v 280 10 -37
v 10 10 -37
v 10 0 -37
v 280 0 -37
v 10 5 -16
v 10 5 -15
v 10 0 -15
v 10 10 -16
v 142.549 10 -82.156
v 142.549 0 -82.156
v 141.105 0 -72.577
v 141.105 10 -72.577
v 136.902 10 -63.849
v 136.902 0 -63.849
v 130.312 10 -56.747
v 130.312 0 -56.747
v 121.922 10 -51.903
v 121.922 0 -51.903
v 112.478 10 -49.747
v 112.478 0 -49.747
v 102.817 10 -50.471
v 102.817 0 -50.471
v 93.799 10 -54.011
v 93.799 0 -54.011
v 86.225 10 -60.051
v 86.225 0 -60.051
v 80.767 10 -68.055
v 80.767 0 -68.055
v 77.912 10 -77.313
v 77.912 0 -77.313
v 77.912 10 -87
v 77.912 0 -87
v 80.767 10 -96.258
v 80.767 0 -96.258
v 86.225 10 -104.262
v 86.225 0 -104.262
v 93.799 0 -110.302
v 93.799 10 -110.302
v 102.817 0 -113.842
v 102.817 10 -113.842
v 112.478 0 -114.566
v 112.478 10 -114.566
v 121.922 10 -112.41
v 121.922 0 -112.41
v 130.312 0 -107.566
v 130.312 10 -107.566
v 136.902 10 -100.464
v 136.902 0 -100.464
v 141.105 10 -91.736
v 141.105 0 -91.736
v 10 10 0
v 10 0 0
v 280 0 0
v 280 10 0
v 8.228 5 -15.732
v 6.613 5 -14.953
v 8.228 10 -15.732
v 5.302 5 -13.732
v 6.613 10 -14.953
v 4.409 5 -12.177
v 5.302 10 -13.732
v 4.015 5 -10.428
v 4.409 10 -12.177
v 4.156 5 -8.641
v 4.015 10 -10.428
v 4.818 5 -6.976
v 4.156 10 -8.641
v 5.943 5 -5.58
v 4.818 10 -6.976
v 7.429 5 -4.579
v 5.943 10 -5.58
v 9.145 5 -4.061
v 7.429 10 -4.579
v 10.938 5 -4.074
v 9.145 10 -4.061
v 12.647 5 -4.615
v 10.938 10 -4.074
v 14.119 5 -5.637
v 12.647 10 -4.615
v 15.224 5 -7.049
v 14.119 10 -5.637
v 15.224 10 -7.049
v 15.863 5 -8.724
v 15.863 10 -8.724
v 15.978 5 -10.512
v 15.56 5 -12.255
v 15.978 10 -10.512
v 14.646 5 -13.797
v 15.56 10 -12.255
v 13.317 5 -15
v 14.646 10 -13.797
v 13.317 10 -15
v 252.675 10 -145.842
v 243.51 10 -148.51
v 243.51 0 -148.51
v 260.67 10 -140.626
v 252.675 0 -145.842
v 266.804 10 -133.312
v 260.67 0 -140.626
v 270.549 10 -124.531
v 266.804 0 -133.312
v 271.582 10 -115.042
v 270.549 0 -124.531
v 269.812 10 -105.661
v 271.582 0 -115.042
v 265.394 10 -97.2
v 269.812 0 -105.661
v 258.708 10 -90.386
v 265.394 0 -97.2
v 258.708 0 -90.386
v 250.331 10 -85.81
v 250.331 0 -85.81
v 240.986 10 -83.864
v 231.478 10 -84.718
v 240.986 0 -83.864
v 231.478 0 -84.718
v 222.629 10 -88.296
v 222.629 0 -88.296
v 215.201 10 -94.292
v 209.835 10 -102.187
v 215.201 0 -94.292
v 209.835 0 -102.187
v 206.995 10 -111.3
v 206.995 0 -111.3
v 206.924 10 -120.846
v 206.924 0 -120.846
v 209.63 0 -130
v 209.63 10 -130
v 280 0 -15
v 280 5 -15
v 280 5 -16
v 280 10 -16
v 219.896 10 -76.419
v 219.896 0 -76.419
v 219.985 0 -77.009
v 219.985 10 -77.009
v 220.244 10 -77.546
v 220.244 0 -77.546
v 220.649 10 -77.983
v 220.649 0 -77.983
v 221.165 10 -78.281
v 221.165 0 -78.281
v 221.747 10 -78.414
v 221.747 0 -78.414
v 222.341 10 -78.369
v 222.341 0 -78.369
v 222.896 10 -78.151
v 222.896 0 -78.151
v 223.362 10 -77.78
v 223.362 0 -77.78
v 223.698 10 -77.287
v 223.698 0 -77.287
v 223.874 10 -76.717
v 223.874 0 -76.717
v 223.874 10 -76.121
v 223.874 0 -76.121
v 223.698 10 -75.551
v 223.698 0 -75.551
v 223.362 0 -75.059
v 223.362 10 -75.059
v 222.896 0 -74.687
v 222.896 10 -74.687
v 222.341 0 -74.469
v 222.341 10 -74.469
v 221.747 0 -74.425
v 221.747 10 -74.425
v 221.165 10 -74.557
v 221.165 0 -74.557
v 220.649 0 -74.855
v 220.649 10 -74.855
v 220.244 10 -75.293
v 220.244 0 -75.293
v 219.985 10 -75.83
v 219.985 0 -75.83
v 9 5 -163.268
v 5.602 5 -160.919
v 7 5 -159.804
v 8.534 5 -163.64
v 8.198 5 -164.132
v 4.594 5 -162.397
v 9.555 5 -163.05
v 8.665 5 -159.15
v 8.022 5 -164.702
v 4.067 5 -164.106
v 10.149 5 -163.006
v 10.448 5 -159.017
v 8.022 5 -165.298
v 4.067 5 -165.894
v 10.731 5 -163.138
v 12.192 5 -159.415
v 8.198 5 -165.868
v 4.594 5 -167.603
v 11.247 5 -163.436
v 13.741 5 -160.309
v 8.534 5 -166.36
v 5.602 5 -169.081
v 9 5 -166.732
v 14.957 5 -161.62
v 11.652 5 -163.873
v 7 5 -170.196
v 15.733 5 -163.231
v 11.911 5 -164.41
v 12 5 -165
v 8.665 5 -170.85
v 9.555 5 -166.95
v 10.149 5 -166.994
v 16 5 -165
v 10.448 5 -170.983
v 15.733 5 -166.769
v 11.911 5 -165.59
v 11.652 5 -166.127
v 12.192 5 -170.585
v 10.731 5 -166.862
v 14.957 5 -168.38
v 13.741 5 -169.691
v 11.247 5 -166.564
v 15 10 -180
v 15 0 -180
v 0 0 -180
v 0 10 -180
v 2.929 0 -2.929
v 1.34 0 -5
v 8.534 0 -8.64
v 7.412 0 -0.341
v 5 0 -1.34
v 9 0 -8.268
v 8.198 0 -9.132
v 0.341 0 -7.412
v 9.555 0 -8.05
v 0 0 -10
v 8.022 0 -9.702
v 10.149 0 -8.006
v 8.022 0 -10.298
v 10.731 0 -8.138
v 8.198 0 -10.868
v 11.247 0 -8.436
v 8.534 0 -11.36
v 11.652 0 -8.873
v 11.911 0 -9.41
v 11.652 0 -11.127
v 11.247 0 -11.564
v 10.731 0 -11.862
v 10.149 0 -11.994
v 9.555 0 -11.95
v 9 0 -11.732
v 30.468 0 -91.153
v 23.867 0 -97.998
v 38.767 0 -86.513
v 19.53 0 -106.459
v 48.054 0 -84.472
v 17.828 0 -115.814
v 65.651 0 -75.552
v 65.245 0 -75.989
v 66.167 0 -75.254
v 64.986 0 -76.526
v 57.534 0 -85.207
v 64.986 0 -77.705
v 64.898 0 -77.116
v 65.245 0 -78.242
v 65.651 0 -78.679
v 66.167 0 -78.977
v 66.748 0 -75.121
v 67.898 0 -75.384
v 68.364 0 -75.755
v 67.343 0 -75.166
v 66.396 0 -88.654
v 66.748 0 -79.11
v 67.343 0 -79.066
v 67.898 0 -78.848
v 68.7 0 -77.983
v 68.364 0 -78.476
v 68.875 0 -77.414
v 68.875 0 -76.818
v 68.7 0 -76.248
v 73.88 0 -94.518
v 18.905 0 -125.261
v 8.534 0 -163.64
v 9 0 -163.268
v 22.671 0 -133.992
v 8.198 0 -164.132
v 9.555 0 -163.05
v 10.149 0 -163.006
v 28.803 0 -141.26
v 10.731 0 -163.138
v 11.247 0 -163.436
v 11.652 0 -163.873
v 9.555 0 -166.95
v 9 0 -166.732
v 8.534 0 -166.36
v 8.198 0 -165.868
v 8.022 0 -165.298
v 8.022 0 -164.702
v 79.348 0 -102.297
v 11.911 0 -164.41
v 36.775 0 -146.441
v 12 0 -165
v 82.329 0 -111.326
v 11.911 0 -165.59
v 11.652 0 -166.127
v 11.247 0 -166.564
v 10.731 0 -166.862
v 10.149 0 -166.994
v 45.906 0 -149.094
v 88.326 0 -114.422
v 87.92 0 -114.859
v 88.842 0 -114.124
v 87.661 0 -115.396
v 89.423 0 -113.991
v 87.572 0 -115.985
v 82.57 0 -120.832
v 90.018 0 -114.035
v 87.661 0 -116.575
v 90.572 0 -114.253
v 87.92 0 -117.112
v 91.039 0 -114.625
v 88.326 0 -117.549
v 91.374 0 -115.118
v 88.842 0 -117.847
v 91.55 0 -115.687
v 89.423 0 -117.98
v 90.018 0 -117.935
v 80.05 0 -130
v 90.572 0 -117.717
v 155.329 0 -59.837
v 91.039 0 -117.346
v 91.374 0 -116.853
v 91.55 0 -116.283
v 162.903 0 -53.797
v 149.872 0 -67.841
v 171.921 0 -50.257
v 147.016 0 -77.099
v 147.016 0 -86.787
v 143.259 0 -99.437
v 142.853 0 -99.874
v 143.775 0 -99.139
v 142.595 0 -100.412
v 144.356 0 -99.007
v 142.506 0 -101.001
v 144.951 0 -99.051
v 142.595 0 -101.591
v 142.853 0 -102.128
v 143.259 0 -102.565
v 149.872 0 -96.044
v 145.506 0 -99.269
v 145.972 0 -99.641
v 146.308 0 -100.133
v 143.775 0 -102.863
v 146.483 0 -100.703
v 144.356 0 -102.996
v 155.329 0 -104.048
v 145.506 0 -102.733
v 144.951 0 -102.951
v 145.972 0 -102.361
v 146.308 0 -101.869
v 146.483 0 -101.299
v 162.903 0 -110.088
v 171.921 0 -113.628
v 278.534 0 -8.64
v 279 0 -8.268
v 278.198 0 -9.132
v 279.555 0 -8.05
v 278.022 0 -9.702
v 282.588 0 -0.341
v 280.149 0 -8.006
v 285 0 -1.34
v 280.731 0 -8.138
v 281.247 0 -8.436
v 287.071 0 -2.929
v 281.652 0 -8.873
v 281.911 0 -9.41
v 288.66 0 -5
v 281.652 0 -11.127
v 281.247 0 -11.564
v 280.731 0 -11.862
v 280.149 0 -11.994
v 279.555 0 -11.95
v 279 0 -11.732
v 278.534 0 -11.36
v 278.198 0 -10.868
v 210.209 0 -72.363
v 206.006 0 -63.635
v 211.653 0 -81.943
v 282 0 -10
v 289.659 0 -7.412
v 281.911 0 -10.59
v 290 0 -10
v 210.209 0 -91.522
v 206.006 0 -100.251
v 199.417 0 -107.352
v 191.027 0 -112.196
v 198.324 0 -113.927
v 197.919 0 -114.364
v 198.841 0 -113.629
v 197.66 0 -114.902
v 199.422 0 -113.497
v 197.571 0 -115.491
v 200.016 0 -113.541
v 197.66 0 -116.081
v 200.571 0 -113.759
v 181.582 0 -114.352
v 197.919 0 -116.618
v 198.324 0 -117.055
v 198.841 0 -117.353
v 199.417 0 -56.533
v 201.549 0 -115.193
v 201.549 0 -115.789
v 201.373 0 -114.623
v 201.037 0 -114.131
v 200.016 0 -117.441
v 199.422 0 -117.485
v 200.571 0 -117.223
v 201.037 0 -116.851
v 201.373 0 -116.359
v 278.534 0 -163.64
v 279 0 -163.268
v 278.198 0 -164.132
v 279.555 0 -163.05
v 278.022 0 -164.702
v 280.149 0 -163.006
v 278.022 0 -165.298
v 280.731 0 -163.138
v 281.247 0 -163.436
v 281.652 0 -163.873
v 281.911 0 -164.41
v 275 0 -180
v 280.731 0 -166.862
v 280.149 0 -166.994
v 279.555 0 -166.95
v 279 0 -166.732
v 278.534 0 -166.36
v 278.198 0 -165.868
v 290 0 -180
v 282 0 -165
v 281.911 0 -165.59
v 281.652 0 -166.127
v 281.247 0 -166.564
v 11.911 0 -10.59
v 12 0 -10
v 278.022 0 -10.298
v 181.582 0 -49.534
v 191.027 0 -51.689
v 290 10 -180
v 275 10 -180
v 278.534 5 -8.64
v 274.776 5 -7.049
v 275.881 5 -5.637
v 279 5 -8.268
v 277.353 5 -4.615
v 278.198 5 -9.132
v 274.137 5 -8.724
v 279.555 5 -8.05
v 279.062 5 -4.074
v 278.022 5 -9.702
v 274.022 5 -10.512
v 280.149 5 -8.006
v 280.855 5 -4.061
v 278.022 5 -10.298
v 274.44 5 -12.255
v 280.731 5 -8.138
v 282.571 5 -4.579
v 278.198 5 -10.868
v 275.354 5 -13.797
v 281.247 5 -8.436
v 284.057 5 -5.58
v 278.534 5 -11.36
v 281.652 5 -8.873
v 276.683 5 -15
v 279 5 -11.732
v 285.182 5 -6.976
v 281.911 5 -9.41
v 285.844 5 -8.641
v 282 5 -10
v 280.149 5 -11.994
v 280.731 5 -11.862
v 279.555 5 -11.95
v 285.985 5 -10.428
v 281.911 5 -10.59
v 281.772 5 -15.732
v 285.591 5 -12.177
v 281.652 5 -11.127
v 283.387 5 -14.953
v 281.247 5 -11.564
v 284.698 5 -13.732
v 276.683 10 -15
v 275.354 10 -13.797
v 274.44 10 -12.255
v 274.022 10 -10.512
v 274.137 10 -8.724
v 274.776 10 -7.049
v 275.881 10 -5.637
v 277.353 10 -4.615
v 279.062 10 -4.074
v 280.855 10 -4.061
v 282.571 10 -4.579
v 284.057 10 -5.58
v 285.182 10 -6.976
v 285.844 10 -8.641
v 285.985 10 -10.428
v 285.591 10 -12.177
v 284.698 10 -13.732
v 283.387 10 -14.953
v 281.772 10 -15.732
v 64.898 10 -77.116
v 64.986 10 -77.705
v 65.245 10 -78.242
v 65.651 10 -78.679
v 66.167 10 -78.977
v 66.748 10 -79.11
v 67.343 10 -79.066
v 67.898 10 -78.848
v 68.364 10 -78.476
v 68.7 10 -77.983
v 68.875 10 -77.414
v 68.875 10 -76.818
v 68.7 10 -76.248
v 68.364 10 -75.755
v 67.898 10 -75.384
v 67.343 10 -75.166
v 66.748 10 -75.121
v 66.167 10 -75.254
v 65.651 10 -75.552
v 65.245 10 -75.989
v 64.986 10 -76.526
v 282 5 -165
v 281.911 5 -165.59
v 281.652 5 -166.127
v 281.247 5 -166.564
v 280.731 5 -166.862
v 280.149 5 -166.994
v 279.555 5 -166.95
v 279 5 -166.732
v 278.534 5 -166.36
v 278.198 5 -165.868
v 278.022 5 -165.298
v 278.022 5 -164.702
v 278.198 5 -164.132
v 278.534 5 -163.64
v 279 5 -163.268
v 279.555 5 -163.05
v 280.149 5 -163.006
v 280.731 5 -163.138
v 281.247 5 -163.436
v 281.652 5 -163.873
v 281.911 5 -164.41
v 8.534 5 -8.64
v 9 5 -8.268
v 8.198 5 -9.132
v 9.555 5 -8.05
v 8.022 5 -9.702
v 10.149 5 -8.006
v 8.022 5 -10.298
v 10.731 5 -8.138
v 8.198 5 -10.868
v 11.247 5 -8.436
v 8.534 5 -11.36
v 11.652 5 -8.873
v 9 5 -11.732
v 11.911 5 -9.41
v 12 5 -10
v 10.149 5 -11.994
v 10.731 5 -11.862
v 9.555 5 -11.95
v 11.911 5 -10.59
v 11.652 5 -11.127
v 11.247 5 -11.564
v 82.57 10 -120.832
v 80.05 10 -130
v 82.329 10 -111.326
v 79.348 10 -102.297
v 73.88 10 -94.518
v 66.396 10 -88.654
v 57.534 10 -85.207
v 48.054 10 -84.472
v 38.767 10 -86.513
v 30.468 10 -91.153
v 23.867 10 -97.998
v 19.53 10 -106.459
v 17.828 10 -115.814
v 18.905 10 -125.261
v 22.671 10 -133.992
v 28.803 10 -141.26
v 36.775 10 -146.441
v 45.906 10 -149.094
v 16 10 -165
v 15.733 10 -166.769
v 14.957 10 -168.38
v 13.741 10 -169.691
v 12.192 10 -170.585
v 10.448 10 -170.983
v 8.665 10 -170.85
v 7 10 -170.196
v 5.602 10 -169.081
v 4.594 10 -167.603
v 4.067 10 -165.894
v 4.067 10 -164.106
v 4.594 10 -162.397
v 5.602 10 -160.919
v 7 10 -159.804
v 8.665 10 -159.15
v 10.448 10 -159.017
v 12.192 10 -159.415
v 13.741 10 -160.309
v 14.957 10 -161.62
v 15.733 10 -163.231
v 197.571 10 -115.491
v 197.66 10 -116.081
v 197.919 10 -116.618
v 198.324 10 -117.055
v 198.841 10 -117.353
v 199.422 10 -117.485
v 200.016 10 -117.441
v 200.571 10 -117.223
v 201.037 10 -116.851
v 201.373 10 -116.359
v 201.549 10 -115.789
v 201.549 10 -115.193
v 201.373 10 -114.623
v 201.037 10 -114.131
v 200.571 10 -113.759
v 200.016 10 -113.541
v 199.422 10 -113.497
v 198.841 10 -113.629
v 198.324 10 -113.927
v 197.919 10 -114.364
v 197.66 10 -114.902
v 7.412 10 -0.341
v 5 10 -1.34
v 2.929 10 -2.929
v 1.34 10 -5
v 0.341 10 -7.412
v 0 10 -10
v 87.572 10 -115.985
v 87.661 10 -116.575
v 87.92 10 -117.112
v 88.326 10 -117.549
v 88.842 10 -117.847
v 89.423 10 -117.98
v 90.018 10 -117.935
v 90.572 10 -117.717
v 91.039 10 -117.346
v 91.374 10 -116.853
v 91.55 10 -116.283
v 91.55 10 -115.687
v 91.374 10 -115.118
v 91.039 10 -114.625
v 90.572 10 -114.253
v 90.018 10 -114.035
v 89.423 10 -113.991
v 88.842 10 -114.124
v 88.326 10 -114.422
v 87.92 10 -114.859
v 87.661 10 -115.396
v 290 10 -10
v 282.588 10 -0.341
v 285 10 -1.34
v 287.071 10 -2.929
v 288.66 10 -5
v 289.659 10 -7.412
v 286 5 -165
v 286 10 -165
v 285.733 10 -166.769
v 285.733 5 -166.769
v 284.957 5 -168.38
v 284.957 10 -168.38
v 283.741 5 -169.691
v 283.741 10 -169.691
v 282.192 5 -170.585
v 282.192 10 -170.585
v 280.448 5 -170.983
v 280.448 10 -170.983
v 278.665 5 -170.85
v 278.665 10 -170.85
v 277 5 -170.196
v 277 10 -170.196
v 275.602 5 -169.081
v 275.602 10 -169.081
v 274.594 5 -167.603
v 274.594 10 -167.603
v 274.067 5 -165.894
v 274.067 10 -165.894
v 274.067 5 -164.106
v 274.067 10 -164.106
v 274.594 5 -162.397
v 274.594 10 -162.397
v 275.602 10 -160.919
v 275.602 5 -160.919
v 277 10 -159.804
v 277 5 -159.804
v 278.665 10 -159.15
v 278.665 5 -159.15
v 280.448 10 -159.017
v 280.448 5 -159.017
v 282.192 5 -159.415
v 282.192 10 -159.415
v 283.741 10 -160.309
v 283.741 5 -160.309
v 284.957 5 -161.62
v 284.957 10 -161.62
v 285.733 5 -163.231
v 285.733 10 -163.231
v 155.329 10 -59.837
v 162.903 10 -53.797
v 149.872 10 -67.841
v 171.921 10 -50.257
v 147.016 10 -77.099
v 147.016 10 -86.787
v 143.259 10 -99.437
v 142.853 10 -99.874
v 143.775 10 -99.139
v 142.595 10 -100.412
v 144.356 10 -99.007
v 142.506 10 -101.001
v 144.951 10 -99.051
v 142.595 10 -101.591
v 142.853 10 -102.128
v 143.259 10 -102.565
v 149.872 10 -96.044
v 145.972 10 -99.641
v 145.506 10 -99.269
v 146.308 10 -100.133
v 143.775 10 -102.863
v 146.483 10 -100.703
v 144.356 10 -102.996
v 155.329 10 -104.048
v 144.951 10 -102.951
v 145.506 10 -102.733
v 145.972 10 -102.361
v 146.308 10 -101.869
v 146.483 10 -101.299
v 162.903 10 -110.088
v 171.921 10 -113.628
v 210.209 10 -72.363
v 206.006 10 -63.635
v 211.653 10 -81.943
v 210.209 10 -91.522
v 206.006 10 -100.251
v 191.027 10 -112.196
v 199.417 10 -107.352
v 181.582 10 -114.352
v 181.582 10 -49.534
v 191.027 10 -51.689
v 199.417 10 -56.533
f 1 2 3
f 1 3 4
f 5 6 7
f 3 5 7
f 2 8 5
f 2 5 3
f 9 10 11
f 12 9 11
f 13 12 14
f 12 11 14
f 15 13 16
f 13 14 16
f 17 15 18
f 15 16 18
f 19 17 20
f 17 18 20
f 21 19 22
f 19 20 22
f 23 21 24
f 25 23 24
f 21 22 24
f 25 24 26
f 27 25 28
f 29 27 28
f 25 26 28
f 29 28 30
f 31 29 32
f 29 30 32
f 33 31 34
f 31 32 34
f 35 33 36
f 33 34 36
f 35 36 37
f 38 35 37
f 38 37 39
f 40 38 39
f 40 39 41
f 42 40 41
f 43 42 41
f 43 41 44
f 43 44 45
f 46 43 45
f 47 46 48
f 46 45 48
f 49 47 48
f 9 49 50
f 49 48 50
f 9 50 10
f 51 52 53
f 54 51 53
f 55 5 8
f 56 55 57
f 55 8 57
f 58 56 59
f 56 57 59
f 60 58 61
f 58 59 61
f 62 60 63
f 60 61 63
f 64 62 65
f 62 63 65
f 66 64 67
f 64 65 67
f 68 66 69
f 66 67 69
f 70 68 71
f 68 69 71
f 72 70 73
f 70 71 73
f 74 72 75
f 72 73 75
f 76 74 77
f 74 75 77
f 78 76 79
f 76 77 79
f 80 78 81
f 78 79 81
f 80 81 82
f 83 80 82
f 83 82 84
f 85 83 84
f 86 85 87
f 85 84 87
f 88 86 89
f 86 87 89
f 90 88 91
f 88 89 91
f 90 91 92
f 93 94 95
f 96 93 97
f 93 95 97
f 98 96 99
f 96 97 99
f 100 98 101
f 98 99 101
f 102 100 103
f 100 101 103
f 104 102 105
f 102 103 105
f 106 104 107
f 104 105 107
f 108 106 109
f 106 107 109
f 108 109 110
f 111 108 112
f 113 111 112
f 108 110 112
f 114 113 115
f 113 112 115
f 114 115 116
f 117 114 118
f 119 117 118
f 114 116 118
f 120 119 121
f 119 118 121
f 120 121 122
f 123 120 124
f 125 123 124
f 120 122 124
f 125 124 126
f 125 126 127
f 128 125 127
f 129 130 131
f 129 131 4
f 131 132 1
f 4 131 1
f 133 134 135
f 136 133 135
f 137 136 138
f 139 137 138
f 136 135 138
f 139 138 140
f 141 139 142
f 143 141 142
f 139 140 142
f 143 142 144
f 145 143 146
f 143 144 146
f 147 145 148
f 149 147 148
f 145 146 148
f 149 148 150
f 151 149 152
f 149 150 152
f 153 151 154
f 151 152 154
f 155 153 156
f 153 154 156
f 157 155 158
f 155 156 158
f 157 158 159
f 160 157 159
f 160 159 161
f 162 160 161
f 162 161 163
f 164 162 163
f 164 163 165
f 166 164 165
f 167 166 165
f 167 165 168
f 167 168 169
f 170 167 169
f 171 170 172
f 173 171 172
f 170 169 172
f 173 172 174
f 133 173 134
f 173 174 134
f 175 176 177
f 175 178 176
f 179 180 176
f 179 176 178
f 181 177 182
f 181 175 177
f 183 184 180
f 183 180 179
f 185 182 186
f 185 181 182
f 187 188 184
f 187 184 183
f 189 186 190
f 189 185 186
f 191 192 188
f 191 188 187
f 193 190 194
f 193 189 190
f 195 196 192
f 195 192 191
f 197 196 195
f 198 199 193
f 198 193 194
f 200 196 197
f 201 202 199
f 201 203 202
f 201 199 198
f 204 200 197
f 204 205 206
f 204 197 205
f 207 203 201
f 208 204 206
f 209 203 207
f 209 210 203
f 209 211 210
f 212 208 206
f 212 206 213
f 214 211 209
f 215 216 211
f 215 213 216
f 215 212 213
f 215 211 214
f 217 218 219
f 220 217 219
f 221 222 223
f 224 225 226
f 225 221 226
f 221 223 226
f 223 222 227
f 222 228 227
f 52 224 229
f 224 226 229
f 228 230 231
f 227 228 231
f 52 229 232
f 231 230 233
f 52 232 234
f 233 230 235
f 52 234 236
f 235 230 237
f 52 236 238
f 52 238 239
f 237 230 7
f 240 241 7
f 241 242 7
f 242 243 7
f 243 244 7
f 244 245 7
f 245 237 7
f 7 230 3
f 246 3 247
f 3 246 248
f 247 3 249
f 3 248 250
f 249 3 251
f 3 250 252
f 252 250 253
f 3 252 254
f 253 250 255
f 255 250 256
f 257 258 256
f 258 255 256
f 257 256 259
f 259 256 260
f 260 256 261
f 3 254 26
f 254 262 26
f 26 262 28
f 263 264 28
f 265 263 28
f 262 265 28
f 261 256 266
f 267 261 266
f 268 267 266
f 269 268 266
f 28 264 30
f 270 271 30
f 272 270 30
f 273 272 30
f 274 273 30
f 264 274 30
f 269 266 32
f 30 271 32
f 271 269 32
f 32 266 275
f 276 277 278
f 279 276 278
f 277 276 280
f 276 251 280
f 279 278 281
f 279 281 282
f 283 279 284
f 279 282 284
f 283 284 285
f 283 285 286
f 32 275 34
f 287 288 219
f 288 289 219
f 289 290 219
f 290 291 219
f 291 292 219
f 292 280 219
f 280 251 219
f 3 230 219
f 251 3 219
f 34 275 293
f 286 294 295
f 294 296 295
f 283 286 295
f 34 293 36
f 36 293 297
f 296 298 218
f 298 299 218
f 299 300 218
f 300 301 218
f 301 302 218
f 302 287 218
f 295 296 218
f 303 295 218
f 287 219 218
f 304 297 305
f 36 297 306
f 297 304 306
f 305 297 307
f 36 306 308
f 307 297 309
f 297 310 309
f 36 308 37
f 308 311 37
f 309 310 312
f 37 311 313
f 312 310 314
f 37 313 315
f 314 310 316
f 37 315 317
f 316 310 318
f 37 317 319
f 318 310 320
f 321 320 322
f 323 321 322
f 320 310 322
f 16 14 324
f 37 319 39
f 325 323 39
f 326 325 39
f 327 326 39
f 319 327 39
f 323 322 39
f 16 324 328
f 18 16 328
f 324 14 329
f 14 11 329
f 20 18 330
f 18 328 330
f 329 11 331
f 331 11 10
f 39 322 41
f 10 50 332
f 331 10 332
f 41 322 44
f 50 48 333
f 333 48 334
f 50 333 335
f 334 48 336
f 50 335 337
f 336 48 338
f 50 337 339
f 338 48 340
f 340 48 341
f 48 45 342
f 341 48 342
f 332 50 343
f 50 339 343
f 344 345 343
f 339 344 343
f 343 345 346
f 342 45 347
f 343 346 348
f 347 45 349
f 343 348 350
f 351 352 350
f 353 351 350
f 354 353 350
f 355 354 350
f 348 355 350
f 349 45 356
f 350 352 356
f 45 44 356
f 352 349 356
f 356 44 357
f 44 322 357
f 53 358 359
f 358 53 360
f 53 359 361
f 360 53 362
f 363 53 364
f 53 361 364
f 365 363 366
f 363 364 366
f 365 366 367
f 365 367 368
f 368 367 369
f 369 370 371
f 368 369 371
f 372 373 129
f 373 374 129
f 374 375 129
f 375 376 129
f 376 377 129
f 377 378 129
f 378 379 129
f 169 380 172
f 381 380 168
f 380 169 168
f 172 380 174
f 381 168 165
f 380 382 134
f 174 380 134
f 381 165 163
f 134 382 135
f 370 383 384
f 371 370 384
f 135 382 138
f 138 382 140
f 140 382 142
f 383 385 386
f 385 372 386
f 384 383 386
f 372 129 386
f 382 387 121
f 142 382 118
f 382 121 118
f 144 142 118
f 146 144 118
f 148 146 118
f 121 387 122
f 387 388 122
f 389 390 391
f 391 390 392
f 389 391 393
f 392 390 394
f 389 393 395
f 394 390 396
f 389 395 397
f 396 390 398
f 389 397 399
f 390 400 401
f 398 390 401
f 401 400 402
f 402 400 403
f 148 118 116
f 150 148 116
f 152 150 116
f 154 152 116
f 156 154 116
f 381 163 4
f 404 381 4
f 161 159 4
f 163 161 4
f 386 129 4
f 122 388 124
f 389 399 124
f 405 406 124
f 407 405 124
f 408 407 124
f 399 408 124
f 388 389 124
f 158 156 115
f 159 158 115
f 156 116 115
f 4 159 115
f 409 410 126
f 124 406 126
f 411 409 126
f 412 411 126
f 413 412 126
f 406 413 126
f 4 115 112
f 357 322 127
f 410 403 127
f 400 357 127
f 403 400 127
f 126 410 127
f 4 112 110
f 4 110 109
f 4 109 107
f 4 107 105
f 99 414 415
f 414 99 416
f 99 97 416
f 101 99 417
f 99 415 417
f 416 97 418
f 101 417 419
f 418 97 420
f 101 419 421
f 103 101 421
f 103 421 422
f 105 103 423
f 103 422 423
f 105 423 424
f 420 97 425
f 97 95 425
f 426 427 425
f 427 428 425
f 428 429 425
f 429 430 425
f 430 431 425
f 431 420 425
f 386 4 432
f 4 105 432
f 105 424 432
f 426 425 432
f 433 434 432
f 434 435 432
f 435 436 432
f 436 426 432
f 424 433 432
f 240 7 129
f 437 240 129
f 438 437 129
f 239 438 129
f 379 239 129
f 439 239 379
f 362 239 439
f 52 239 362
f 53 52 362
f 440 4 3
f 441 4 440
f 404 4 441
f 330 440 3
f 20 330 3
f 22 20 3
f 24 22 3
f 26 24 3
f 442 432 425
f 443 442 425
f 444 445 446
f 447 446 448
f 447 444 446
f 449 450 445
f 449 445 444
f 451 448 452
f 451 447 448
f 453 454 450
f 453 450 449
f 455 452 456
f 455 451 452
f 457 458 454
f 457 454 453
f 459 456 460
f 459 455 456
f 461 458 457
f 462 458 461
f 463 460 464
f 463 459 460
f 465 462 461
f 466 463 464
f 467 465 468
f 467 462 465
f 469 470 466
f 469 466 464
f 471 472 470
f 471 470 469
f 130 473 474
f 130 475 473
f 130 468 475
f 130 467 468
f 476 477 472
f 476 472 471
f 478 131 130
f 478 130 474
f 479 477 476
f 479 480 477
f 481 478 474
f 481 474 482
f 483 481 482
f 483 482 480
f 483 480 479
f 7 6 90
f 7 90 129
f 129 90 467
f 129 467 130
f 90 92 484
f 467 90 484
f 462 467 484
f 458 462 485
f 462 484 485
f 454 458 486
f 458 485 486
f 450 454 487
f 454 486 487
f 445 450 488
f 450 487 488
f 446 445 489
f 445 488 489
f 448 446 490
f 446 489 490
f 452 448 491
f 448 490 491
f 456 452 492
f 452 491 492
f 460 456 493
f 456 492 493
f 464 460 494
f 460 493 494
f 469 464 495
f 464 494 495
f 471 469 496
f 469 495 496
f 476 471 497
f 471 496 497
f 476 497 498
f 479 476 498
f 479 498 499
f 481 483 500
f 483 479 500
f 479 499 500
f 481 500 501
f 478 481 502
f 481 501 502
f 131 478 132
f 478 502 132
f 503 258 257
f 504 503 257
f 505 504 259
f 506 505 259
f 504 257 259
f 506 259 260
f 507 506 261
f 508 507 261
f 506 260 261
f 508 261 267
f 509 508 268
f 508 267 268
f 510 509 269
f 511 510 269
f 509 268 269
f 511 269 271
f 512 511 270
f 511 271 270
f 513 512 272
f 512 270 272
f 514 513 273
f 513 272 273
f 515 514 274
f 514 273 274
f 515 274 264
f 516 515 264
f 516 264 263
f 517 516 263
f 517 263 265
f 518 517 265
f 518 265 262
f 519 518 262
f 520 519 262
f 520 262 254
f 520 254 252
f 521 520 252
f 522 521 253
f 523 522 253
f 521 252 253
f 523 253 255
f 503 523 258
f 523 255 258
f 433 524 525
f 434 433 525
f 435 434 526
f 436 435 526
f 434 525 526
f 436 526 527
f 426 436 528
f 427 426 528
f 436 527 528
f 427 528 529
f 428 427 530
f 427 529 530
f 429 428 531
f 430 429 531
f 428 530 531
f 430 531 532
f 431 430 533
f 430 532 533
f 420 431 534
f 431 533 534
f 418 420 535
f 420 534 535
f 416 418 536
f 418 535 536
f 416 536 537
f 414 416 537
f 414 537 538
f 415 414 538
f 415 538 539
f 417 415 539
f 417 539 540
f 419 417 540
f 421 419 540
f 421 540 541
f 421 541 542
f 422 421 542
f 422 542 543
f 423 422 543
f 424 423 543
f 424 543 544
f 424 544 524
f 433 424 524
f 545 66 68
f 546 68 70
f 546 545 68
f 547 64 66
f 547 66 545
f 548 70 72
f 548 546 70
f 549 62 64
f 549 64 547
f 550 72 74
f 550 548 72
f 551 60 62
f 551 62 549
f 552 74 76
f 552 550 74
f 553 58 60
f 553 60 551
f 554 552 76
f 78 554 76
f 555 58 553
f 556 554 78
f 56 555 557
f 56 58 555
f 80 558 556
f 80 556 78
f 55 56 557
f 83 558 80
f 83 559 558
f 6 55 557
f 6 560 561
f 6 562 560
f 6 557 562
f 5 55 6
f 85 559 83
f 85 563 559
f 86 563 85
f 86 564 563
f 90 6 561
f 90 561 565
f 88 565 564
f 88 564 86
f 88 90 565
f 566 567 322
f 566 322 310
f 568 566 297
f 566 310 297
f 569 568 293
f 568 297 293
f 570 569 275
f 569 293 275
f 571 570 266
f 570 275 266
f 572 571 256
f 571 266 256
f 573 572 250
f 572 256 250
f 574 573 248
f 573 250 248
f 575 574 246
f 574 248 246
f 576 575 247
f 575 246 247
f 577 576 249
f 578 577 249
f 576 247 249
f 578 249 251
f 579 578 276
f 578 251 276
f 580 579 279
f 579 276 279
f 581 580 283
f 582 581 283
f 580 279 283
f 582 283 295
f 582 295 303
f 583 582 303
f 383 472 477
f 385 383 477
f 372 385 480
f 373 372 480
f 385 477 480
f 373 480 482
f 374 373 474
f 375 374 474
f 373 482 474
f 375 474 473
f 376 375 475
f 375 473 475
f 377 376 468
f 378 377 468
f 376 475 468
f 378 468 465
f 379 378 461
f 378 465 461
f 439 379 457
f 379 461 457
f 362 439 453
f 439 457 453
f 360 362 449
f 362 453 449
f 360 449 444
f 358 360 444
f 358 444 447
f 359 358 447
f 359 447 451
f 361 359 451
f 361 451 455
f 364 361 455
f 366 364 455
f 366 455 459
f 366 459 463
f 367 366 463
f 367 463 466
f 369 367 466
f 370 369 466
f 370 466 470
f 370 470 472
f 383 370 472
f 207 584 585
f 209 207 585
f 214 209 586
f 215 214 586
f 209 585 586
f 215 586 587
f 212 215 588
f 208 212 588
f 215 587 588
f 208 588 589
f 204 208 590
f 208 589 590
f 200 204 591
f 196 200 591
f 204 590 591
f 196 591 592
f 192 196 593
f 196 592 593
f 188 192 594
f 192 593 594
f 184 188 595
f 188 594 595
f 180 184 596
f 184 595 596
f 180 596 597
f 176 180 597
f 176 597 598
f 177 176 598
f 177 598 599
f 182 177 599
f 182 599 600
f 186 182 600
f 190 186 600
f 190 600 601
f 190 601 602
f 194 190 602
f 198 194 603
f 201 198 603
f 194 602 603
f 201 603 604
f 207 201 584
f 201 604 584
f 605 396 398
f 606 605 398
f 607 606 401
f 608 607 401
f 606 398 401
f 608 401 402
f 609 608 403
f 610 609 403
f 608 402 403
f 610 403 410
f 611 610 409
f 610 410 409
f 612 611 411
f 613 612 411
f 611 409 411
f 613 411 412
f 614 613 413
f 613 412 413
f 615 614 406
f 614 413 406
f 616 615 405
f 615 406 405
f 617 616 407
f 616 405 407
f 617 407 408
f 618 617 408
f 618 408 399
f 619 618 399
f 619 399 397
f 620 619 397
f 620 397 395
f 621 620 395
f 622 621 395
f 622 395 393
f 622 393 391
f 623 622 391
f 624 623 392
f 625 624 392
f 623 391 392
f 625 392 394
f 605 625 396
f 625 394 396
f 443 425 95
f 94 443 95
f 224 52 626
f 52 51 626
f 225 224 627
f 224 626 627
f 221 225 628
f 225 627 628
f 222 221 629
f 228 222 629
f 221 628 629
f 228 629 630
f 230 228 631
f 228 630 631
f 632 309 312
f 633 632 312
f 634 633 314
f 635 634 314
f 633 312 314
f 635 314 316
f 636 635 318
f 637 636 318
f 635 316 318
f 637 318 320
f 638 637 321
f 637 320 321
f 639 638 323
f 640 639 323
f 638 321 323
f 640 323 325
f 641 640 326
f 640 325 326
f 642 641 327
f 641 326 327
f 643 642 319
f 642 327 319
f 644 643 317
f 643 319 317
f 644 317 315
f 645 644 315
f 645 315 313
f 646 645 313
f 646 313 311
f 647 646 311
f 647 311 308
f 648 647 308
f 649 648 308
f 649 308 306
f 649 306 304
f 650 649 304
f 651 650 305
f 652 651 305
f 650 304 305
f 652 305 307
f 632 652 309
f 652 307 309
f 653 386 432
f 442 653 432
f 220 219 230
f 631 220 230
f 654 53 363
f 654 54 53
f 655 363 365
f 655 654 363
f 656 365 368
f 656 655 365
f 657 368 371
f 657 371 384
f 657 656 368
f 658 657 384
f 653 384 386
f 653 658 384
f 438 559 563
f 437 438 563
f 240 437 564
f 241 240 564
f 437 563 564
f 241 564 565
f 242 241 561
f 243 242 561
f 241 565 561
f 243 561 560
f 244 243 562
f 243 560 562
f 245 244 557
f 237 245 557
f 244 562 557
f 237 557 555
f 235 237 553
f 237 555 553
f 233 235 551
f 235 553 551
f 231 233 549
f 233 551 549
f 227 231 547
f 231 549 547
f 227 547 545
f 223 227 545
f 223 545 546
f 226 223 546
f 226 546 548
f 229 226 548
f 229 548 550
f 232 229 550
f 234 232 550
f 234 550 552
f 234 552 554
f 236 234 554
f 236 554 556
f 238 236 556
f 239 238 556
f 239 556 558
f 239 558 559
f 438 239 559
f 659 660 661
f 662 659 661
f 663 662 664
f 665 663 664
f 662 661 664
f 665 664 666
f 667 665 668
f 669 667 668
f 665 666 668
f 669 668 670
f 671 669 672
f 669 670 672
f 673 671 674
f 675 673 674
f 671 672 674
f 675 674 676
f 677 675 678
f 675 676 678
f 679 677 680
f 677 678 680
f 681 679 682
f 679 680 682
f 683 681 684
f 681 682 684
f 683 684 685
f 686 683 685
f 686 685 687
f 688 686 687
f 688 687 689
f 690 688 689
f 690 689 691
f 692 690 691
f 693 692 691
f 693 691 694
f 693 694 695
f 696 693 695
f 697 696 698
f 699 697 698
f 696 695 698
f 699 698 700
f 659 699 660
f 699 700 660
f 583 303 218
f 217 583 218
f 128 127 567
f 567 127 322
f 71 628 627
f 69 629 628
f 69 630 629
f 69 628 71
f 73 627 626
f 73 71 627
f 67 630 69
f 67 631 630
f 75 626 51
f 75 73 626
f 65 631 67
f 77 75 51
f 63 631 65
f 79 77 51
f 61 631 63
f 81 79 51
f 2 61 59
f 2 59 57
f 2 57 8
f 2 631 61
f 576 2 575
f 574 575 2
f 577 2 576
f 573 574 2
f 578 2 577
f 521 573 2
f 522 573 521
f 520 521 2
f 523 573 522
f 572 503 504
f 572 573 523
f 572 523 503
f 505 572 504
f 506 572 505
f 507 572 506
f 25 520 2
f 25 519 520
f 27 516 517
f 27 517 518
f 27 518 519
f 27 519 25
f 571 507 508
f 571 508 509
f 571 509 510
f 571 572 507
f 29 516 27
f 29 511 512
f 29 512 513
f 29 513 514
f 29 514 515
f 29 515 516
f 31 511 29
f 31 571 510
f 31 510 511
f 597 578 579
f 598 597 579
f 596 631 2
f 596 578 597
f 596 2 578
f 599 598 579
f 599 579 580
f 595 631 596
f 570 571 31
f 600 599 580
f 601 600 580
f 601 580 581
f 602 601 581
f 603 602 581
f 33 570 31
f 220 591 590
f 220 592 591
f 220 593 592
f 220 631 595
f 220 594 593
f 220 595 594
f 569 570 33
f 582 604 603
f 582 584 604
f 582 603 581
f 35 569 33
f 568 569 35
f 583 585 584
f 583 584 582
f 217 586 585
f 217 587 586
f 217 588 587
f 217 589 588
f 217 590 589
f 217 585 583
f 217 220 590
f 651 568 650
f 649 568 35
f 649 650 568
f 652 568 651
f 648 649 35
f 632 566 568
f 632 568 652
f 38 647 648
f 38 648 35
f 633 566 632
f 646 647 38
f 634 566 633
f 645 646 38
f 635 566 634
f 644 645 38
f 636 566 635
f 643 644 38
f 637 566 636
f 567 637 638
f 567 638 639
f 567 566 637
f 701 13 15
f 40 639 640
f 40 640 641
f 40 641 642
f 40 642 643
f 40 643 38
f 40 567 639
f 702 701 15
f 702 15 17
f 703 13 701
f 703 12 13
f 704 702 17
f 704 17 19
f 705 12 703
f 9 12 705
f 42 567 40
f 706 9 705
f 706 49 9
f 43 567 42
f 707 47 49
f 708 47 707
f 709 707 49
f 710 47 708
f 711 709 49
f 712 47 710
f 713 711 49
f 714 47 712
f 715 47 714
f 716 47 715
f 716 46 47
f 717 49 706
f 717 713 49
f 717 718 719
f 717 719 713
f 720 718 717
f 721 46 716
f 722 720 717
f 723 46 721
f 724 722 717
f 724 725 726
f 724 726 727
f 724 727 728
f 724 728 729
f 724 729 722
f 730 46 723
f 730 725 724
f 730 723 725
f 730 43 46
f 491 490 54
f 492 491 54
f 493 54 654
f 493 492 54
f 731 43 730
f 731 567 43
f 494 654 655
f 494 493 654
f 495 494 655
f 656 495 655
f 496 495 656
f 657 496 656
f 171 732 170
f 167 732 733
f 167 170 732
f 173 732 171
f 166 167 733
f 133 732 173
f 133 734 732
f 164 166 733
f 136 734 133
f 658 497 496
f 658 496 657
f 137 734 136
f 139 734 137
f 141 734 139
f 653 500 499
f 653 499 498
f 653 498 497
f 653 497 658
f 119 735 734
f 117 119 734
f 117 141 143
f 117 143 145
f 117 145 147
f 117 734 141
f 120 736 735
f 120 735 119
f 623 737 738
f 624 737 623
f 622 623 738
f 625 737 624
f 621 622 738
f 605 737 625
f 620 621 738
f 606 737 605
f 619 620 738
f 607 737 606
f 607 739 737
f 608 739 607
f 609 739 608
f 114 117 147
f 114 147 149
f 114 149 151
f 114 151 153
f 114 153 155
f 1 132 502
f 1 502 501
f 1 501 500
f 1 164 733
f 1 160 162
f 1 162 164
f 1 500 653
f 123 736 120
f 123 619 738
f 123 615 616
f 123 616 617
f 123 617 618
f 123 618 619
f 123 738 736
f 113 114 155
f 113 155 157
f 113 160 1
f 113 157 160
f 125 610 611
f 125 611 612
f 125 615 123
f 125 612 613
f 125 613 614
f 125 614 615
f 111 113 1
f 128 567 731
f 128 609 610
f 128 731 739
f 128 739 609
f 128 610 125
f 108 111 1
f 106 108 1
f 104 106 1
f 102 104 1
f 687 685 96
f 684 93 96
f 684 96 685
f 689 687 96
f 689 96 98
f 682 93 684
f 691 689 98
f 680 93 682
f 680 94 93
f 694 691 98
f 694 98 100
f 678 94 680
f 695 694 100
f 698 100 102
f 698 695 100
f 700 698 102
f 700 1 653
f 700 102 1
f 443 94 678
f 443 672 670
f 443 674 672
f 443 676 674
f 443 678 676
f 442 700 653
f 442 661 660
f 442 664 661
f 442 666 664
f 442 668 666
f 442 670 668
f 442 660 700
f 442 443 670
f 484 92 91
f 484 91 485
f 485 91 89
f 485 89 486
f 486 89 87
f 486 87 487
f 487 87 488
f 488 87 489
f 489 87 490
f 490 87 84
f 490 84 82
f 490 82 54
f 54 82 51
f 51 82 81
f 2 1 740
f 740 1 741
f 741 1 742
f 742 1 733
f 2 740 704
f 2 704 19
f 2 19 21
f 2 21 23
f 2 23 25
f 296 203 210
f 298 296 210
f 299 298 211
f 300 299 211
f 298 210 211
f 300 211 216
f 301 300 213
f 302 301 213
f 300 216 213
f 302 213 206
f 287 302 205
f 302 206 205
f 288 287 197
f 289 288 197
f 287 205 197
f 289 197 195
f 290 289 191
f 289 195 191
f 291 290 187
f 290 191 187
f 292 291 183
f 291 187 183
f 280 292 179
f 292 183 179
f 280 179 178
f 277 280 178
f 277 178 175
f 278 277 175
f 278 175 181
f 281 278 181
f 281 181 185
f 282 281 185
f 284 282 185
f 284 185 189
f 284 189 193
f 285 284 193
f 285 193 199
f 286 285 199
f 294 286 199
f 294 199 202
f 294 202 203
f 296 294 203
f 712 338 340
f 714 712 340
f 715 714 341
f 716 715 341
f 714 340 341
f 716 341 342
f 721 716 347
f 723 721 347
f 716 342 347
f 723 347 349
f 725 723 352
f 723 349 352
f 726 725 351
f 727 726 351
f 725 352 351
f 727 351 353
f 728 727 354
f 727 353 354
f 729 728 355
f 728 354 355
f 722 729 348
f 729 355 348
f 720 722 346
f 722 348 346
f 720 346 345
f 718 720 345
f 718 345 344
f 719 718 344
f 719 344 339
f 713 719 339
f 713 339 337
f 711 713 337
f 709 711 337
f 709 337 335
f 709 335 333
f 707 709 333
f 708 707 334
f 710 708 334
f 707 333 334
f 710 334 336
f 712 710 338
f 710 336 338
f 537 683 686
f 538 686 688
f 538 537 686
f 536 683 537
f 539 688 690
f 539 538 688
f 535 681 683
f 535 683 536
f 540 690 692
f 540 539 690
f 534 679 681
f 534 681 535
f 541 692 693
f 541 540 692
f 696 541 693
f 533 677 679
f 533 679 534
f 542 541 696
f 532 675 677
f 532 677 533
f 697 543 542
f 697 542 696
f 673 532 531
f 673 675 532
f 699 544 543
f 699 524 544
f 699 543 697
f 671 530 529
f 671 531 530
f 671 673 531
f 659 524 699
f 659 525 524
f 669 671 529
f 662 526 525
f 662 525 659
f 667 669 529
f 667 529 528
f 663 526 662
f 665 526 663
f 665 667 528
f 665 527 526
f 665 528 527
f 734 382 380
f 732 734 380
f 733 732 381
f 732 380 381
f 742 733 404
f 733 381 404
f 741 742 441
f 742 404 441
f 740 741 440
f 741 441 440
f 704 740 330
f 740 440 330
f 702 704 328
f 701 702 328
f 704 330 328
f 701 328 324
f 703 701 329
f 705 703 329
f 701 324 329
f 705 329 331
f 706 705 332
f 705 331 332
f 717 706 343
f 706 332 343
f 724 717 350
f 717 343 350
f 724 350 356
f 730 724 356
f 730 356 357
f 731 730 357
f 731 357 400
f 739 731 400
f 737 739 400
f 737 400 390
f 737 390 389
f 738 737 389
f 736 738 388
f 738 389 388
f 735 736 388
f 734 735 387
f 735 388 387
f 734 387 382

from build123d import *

# Parameters (mm, degrees)
BOSS_EXTRU_1_DEPTH      = 10
ESQUISSE3_R             = 2
ENL_V_MAT_EXTRU_1_DEPTH = 10
CONG_1_R                = 10
ESQUISSE4_R             = 32.5
ENL_V_MAT_EXTRU_2_DEPTH = 10
ESQUISSE5_R             = 2
ENL_V_MAT_EXTRU_3_DEPTH = 10
ESQUISSE6_W             = 270
ESQUISSE6_H             = 22
ENL_V_MAT_EXTRU_4_DEPTH = 10
ESQUISSE7_R             = 2
ENL_V_MAT_EXTRU_5_DEPTH = 10
ESQUISSE10_R            = 6
ENL_V_MAT_EXTRU_6_DEPTH = 5


with BuildPart() as part:
    # Esquisse2 → Boss.-Extru.1 (new body)
    with BuildSketch(Plane(origin=(0, 0, 0), x_dir=(1, 0, 0), z_dir=(0, 1, 0))):
        Polygon((0, 0), (290, 0), (290, 180), (275, 180), (225, 130), (65, 130), (15, 180), (0, 180), align=None)
    extrude(amount=BOSS_EXTRU_1_DEPTH)

    # Esquisse3 → Enlèv. mat.-Extru.1 (cut)
    with BuildSketch(Plane(origin=(0, 10, 0), x_dir=(1, 0, 0), z_dir=(0, 1, 0))):
        with Locations((10, 10)):
            Circle(ESQUISSE3_R)
        with Locations((280, 10)):
            Circle(ESQUISSE3_R)
    extrude(amount=-ENL_V_MAT_EXTRU_1_DEPTH, mode=Mode.SUBTRACT)

    # Congé1
    cong_1_edges = [part.edges().sort_by_distance(p)[0] for p in [
        (290, 5, 0),
        (0, 5, 0),
    ]]
    fillet(cong_1_edges, radius=CONG_1_R)

    # Esquisse4 → Enlèv. mat.-Extru.2 (cut)
    with BuildSketch(Plane.XZ):
        with Locations((239.106279441, -116.309672248)):
            Circle(ESQUISSE4_R)
        with Locations((179.153264776, -81.942630954)):
            Circle(ESQUISSE4_R)
        with Locations((110.048910395, -82.156407472)):
            Circle(ESQUISSE4_R)
        with Locations((50.309672248, -116.893720559)):
            Circle(ESQUISSE4_R)
    extrude(amount=-ENL_V_MAT_EXTRU_2_DEPTH, mode=Mode.SUBTRACT)

    # Esquisse5 → Enlèv. mat.-Extru.3 (cut)
    with BuildSketch(Plane(origin=(0, 0, 0), x_dir=(-1, 0, 0), z_dir=(0, -1, 0))):
        with Locations((-144.50570114, 101.001110603)):
            Circle(ESQUISSE5_R)
        with Locations((-199.571369329, 115.491017964)):
            Circle(ESQUISSE5_R)
        with Locations((-221.896020418, 76.419161677)):
            Circle(ESQUISSE5_R)
        with Locations((-66.897585359, 77.115673706)):
            Circle(ESQUISSE5_R)
        with Locations((-89.572479932, 115.985316824)):
            Circle(ESQUISSE5_R)
    extrude(amount=-ENL_V_MAT_EXTRU_3_DEPTH, mode=Mode.SUBTRACT)

    # Esquisse6 → Enlèv. mat.-Extru.4 (cut)
    with BuildSketch(Plane(origin=(0, 10, 0), x_dir=(1, 0, 0), z_dir=(0, 1, 0))):
        with Locations((145, 26)):
            Rectangle(ESQUISSE6_W, ESQUISSE6_H)
    extrude(amount=-ENL_V_MAT_EXTRU_4_DEPTH, mode=Mode.SUBTRACT)

    # Esquisse7 → Enlèv. mat.-Extru.5 (cut)
    with BuildSketch(Plane(origin=(0, 10, 0), x_dir=(1, 0, 0), z_dir=(0, 1, 0))):
        with Locations((10, 165)):
            Circle(ESQUISSE7_R)
        with Locations((280, 165)):
            Circle(ESQUISSE7_R)
    extrude(amount=-ENL_V_MAT_EXTRU_5_DEPTH, mode=Mode.SUBTRACT)

    # Esquisse10 → Enlèv. mat.-Extru.6 (cut)
    with BuildSketch(Plane(origin=(0, 10, 0), x_dir=(1, 0, 0), z_dir=(0, 1, 0))):
        with Locations((10, 165)):
            Circle(ESQUISSE10_R)
        with Locations((280, 165)):
            Circle(ESQUISSE10_R)
        with Locations((280, 10)):
            Circle(ESQUISSE10_R)
        with Locations((10, 10)):
            Circle(ESQUISSE10_R)
    extrude(amount=-ENL_V_MAT_EXTRU_6_DEPTH, mode=Mode.SUBTRACT)


solid = part.part
